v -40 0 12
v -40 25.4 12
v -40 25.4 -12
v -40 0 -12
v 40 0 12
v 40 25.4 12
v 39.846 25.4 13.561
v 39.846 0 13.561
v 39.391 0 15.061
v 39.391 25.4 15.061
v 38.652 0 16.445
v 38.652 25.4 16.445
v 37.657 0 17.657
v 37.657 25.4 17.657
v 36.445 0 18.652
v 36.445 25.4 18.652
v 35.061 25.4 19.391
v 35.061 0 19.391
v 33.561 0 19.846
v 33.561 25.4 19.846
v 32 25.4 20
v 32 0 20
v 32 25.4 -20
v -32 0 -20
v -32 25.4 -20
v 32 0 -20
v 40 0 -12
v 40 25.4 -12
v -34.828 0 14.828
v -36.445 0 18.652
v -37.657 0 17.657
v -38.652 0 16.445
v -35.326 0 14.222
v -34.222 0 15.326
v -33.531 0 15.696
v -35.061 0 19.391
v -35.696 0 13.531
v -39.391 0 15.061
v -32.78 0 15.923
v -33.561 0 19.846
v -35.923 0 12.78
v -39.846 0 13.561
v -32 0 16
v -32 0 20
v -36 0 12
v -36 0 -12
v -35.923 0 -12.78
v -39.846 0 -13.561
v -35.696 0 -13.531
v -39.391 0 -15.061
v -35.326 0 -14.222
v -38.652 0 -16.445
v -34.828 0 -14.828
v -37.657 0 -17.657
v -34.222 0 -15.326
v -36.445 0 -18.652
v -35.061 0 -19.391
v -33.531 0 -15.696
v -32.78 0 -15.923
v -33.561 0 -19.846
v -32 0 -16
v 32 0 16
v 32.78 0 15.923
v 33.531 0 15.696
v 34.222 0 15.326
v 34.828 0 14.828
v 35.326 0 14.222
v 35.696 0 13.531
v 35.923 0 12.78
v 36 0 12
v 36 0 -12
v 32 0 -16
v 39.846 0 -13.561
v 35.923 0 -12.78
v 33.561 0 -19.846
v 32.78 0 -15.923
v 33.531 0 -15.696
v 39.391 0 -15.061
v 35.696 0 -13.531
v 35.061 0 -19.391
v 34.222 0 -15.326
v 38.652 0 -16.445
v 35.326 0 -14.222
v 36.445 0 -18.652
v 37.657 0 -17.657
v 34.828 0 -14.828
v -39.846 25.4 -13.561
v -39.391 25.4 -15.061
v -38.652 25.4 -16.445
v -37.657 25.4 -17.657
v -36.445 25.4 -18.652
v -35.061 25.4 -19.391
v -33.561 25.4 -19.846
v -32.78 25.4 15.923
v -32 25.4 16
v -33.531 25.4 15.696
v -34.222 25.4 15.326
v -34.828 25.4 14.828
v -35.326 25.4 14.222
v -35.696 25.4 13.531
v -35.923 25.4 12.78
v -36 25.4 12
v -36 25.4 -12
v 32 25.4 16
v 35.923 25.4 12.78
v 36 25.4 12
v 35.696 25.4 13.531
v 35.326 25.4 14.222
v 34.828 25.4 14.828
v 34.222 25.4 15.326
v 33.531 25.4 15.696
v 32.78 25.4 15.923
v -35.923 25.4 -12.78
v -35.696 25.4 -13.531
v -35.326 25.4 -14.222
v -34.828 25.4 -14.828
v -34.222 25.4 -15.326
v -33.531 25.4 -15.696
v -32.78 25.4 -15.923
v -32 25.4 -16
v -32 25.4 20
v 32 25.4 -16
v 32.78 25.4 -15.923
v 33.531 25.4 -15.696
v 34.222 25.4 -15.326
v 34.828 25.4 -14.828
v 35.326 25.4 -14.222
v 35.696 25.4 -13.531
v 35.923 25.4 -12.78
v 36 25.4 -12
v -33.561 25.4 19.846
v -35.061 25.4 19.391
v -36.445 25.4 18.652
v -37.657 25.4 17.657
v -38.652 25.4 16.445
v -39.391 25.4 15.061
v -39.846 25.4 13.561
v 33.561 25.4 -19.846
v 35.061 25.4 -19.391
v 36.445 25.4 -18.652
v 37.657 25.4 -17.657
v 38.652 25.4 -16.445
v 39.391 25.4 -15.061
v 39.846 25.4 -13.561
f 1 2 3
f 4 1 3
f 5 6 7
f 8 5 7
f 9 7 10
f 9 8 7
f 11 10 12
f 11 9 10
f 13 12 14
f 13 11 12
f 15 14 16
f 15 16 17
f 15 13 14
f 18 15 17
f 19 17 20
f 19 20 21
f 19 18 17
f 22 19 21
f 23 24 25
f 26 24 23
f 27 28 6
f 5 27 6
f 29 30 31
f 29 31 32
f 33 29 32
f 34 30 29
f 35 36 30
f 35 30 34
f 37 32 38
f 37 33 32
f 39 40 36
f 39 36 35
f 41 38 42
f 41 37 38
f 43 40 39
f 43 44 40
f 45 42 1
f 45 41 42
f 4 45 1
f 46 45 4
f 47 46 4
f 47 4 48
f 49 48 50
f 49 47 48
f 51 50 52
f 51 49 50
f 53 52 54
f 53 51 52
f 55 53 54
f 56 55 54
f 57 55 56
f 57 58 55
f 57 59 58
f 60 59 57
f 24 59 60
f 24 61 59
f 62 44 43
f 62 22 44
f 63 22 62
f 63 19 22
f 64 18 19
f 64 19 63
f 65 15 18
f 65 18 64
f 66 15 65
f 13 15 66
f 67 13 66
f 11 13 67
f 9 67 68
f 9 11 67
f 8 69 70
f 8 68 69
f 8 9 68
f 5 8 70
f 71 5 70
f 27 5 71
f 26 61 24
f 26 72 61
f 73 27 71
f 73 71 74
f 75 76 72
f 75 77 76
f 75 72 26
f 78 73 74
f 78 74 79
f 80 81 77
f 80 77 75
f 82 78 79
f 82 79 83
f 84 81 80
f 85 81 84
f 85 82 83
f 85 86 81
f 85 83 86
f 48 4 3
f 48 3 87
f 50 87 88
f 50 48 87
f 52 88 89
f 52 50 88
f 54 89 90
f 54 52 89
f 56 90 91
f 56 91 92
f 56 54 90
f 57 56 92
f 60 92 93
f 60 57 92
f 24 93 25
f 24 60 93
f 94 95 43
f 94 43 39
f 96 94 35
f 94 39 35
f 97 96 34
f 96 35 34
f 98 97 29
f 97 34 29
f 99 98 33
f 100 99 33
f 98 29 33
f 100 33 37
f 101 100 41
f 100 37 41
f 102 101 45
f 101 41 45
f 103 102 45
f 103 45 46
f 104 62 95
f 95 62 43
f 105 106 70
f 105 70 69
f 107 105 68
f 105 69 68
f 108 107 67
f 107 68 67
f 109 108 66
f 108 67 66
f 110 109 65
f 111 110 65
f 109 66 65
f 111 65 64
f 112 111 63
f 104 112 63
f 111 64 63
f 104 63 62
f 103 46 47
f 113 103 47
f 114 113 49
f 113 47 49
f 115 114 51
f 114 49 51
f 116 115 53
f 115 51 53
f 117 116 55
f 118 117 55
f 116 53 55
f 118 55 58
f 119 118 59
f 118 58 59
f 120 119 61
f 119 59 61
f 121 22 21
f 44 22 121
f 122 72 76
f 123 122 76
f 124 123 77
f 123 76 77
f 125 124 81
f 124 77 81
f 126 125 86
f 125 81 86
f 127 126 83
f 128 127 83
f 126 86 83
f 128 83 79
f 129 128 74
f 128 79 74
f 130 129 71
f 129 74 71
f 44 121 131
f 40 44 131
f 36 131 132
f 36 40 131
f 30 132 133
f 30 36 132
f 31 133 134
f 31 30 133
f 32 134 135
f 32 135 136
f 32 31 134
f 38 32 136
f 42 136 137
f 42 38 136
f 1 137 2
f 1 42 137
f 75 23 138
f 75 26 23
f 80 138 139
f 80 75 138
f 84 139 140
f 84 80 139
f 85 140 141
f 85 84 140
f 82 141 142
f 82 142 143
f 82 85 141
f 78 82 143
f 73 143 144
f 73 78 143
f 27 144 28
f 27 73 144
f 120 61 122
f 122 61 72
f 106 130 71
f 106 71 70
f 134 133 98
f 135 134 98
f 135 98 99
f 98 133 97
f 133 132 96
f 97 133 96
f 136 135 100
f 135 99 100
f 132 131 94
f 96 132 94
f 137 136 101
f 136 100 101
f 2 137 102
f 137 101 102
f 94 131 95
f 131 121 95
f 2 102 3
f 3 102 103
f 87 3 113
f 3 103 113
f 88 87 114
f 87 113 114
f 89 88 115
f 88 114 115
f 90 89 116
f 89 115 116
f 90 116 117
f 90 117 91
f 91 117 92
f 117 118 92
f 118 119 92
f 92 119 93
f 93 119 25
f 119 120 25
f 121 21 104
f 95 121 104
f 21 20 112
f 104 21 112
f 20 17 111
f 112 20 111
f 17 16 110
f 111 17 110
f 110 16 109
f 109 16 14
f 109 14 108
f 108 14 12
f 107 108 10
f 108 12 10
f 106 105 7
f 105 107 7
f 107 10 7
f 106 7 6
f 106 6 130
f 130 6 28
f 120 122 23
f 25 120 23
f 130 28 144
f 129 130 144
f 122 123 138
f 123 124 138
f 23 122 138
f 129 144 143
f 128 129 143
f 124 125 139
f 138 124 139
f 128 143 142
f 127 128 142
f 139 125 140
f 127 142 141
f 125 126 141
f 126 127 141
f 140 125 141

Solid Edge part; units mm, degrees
sketch "Sketch1" plane through (0, 0, 0) normal (0, -1, 0) x (1, 0, 0)
  arc A0 (-32, 16) -> (-36, 12) centre (-32, 12) ccw
  line L0 (-36, 12) -> (-36, -12)
  arc A1 (-36, -12) -> (-32, -16) centre (-32, -12) ccw
  line L1 (-32, -16) -> (32, -16)
  arc A2 (32, -16) -> (36, -12) centre (32, -12) ccw
  line L2 (36, -12) -> (36, 12)
  arc A3 (36, 12) -> (32, 16) centre (32, 12) ccw
  line L3 (32, 16) -> (-32, 16)
  arc A4 (-32, 20) -> (-40, 12) centre (-32, 12) ccw
  line L4 (-40, 12) -> (-40, -12)
  arc A5 (-40, -12) -> (-32, -20) centre (-32, -12) ccw
  line L5 (-32, -20) -> (32, -20)
  arc A6 (32, -20) -> (40, -12) centre (32, -12) ccw
  line L6 (40, -12) -> (40, 12)
  arc A7 (40, 12) -> (32, 20) centre (32, 12) ccw
  line L7 (32, 20) -> (-32, 20)
  dimension "D1" = 32
extrude "Protrusion1" add sketch "Sketch1" against normal blind 25.4
